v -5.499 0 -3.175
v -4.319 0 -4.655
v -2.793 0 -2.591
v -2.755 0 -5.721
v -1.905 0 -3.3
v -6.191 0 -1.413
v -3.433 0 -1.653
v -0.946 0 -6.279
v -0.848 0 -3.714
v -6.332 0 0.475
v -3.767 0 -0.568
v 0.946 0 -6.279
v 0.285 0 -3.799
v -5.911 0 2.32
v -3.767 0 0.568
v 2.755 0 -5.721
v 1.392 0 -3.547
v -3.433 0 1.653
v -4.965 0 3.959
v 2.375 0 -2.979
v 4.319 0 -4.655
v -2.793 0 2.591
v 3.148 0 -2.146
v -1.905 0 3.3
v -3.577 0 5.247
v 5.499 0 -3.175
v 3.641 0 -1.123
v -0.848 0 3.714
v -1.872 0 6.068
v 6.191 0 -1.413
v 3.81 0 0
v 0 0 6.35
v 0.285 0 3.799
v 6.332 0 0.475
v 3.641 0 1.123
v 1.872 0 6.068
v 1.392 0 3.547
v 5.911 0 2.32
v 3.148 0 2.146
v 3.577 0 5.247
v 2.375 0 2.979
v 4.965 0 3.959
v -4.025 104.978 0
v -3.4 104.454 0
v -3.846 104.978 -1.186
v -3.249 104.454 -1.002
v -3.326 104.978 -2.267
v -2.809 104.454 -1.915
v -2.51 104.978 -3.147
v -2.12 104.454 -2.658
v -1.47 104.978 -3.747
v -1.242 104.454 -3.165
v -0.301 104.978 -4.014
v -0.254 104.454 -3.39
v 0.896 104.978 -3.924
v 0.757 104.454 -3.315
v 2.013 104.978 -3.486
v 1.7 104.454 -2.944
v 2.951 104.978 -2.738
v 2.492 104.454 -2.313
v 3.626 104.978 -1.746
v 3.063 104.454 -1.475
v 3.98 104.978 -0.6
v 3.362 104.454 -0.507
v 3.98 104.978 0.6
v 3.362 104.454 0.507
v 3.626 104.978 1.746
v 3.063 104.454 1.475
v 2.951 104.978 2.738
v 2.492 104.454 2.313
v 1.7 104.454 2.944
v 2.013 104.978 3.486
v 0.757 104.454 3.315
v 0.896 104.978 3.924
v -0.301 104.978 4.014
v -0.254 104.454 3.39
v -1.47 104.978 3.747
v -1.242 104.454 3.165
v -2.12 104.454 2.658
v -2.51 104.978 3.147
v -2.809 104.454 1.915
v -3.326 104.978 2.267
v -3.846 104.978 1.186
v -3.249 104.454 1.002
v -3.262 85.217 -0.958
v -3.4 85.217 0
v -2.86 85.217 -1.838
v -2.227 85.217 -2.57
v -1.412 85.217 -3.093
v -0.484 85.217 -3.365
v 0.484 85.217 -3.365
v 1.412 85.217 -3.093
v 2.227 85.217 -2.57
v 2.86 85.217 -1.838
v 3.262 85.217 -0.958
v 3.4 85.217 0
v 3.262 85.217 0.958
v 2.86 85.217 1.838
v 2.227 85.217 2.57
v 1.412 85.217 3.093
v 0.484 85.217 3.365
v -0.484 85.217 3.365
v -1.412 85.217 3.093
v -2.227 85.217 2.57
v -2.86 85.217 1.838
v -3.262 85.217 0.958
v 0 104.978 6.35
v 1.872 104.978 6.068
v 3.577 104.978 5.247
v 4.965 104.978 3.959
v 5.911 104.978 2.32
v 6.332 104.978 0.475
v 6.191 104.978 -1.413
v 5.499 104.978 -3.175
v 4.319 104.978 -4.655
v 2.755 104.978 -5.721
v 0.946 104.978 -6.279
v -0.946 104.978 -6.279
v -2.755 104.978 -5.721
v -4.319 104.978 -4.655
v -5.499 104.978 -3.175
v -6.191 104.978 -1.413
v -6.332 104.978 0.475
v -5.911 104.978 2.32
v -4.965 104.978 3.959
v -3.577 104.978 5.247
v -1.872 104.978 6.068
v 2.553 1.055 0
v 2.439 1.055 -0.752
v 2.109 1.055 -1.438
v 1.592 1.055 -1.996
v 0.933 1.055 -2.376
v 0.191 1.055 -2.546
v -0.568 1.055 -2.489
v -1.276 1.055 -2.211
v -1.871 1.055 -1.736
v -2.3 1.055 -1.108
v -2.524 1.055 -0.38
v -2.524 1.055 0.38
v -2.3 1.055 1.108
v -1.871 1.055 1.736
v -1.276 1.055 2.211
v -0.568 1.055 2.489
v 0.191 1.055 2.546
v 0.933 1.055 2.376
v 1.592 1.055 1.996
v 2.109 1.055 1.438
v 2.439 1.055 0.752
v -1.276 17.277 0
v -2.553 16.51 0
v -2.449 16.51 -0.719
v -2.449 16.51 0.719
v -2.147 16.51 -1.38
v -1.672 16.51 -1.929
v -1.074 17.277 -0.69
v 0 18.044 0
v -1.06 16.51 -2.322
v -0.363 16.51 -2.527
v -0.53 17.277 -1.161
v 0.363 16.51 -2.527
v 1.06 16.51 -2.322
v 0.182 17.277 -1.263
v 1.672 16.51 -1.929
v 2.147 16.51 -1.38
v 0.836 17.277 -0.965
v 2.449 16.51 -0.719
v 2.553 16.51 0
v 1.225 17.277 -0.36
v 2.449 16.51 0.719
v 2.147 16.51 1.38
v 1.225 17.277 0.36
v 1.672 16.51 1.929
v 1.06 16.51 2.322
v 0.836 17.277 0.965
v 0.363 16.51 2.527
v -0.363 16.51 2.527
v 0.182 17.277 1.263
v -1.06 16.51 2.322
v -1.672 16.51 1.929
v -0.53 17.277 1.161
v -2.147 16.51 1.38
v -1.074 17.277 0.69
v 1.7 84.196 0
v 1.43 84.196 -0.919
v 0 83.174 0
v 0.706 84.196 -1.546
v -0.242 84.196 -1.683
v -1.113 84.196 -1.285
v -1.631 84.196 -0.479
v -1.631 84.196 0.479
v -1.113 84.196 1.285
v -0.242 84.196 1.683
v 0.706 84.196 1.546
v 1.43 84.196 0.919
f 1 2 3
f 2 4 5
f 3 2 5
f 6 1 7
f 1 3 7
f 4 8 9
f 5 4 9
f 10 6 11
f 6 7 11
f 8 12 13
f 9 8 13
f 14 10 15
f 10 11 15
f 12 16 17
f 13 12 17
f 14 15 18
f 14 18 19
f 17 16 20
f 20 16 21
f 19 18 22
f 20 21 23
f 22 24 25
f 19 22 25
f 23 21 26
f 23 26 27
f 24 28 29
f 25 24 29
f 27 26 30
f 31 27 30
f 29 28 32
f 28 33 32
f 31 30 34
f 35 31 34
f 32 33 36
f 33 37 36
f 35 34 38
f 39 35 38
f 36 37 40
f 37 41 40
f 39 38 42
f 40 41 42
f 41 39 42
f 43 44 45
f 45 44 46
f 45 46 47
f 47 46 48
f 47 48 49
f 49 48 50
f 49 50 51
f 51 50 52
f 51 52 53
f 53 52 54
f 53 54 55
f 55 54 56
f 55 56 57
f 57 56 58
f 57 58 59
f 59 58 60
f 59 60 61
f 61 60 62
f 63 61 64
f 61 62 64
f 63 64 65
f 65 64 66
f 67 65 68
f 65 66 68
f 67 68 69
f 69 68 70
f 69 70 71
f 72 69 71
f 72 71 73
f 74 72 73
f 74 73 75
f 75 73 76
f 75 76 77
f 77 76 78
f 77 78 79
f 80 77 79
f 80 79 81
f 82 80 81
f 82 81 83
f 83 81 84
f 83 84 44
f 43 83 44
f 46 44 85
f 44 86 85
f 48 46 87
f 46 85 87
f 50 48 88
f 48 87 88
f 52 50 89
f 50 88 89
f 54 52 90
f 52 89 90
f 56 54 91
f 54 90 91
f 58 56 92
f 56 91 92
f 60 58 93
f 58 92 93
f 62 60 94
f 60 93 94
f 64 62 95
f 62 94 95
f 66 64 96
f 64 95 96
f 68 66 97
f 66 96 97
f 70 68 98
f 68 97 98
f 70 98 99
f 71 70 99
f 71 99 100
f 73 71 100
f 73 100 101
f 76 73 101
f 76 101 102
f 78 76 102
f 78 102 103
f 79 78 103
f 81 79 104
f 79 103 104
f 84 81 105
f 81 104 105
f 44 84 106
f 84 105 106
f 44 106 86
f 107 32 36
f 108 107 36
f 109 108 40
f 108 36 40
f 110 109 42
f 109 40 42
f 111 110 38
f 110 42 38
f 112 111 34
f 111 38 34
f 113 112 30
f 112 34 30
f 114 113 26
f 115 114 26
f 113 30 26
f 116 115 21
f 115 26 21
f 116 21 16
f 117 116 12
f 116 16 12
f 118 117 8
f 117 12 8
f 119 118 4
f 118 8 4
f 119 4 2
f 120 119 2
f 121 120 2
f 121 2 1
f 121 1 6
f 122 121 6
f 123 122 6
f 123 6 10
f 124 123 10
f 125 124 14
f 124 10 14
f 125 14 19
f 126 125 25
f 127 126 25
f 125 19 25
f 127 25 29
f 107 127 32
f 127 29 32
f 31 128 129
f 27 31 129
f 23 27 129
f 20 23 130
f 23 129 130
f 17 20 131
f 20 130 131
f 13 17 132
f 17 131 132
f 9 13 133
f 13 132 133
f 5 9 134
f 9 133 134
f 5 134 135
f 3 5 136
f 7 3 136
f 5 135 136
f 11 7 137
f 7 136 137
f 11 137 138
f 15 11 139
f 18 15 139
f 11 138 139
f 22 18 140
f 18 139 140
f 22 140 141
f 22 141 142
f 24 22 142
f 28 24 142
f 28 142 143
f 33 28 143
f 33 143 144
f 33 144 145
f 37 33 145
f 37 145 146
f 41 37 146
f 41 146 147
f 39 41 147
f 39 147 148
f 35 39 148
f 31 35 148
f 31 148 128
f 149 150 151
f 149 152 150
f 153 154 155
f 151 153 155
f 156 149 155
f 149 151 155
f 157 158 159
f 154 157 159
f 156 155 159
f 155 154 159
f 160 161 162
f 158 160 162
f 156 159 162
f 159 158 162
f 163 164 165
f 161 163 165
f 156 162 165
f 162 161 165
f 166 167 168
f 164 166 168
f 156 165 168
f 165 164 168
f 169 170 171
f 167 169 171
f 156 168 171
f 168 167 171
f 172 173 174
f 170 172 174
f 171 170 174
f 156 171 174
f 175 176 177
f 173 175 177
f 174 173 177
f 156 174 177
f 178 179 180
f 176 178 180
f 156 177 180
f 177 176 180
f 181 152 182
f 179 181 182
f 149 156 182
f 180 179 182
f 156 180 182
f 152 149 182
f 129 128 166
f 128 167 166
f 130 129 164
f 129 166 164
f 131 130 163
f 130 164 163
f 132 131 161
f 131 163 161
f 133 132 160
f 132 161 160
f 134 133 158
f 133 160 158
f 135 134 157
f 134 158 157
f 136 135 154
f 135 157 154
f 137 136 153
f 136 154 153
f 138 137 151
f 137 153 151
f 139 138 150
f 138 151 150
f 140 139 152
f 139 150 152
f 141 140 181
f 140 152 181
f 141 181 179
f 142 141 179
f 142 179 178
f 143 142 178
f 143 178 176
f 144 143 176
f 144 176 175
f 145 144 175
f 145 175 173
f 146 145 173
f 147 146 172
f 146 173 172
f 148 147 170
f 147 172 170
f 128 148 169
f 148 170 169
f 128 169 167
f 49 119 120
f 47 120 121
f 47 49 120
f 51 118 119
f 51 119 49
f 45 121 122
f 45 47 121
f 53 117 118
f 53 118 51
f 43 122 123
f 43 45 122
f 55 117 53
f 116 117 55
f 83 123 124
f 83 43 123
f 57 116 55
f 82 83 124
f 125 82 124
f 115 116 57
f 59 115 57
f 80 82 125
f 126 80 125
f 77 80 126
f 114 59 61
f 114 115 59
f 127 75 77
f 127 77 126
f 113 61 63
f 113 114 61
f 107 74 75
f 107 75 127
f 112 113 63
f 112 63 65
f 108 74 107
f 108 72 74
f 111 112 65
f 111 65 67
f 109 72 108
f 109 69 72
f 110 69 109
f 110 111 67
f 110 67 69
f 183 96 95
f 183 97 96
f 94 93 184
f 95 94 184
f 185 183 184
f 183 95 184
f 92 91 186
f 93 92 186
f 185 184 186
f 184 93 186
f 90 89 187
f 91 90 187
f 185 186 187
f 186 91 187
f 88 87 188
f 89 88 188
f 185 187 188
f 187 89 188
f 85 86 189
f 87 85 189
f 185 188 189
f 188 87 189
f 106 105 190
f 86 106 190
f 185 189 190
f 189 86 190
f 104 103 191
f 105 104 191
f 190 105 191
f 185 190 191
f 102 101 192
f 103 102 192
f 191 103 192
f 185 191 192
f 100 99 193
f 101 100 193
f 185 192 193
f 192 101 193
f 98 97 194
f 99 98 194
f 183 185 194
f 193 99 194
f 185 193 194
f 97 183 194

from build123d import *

# Parameters (mm, degrees)
SKETCH1_R                         = 6.35
BOSS_EXTRUDE1_DEPTH               = 104.9782
M8X1_25_TAPPED_HOLE1_D            = 6.8
M8X1_25_TAPPED_HOLE1_DEPTH        = 19.7612
M8X1_25_TAPPED_HOLE1_CSINK_D      = 8.05
M8X1_25_TAPPED_HOLE1_CSINK_ANGLE  = 100
M8X1_25_TAPPED_HOLE1_TIP          = 2.042926105
F_1_4_20_TAPPED_HOLE1_D           = 5.1054
F_1_4_20_TAPPED_HOLE1_DEPTH       = 16.51
F_1_4_20_TAPPED_HOLE1_CSINK_D     = 7.62
F_1_4_20_TAPPED_HOLE1_CSINK_ANGLE = 100
F_1_4_20_TAPPED_HOLE1_TIP         = 1.533816902


with BuildPart() as part:
    # Sketch1 → Boss-Extrude1 (new body)
    with BuildSketch(Plane(origin=(0, 0, 0), x_dir=(1, 0, 0), z_dir=(0, 1, 0))):
        with Locations(Location((0, 0, 0), (0, 0, 270))):
            Circle(SKETCH1_R)
    extrude(amount=BOSS_EXTRUDE1_DEPTH)

    # M8x1.25 Tapped Hole1
    with Locations(Plane(origin=(0, 104.9782, 0), x_dir=(1, 0, 0), z_dir=(0, 1, 0))):
        with Locations((0, 0)):
            CounterSinkHole(M8X1_25_TAPPED_HOLE1_D / 2, M8X1_25_TAPPED_HOLE1_CSINK_D / 2, depth=M8X1_25_TAPPED_HOLE1_DEPTH, counter_sink_angle=M8X1_25_TAPPED_HOLE1_CSINK_ANGLE)
            with Locations((0, 0, -(M8X1_25_TAPPED_HOLE1_DEPTH + M8X1_25_TAPPED_HOLE1_TIP / 2))):  # 118° drill point
                Cone(0, M8X1_25_TAPPED_HOLE1_D / 2, M8X1_25_TAPPED_HOLE1_TIP, mode=Mode.SUBTRACT)

    # 1/4-20 Tapped Hole1
    with Locations(Plane(origin=(0, 0, 0), x_dir=(-1, 0, 0), z_dir=(0, -1, 0))):
        with Locations((0, 0)):
            CounterSinkHole(F_1_4_20_TAPPED_HOLE1_D / 2, F_1_4_20_TAPPED_HOLE1_CSINK_D / 2, depth=F_1_4_20_TAPPED_HOLE1_DEPTH, counter_sink_angle=F_1_4_20_TAPPED_HOLE1_CSINK_ANGLE)
            with Locations((0, 0, -(F_1_4_20_TAPPED_HOLE1_DEPTH + F_1_4_20_TAPPED_HOLE1_TIP / 2))):  # 118° drill point
                Cone(0, F_1_4_20_TAPPED_HOLE1_D / 2, F_1_4_20_TAPPED_HOLE1_TIP, mode=Mode.SUBTRACT)


solid = part.part
